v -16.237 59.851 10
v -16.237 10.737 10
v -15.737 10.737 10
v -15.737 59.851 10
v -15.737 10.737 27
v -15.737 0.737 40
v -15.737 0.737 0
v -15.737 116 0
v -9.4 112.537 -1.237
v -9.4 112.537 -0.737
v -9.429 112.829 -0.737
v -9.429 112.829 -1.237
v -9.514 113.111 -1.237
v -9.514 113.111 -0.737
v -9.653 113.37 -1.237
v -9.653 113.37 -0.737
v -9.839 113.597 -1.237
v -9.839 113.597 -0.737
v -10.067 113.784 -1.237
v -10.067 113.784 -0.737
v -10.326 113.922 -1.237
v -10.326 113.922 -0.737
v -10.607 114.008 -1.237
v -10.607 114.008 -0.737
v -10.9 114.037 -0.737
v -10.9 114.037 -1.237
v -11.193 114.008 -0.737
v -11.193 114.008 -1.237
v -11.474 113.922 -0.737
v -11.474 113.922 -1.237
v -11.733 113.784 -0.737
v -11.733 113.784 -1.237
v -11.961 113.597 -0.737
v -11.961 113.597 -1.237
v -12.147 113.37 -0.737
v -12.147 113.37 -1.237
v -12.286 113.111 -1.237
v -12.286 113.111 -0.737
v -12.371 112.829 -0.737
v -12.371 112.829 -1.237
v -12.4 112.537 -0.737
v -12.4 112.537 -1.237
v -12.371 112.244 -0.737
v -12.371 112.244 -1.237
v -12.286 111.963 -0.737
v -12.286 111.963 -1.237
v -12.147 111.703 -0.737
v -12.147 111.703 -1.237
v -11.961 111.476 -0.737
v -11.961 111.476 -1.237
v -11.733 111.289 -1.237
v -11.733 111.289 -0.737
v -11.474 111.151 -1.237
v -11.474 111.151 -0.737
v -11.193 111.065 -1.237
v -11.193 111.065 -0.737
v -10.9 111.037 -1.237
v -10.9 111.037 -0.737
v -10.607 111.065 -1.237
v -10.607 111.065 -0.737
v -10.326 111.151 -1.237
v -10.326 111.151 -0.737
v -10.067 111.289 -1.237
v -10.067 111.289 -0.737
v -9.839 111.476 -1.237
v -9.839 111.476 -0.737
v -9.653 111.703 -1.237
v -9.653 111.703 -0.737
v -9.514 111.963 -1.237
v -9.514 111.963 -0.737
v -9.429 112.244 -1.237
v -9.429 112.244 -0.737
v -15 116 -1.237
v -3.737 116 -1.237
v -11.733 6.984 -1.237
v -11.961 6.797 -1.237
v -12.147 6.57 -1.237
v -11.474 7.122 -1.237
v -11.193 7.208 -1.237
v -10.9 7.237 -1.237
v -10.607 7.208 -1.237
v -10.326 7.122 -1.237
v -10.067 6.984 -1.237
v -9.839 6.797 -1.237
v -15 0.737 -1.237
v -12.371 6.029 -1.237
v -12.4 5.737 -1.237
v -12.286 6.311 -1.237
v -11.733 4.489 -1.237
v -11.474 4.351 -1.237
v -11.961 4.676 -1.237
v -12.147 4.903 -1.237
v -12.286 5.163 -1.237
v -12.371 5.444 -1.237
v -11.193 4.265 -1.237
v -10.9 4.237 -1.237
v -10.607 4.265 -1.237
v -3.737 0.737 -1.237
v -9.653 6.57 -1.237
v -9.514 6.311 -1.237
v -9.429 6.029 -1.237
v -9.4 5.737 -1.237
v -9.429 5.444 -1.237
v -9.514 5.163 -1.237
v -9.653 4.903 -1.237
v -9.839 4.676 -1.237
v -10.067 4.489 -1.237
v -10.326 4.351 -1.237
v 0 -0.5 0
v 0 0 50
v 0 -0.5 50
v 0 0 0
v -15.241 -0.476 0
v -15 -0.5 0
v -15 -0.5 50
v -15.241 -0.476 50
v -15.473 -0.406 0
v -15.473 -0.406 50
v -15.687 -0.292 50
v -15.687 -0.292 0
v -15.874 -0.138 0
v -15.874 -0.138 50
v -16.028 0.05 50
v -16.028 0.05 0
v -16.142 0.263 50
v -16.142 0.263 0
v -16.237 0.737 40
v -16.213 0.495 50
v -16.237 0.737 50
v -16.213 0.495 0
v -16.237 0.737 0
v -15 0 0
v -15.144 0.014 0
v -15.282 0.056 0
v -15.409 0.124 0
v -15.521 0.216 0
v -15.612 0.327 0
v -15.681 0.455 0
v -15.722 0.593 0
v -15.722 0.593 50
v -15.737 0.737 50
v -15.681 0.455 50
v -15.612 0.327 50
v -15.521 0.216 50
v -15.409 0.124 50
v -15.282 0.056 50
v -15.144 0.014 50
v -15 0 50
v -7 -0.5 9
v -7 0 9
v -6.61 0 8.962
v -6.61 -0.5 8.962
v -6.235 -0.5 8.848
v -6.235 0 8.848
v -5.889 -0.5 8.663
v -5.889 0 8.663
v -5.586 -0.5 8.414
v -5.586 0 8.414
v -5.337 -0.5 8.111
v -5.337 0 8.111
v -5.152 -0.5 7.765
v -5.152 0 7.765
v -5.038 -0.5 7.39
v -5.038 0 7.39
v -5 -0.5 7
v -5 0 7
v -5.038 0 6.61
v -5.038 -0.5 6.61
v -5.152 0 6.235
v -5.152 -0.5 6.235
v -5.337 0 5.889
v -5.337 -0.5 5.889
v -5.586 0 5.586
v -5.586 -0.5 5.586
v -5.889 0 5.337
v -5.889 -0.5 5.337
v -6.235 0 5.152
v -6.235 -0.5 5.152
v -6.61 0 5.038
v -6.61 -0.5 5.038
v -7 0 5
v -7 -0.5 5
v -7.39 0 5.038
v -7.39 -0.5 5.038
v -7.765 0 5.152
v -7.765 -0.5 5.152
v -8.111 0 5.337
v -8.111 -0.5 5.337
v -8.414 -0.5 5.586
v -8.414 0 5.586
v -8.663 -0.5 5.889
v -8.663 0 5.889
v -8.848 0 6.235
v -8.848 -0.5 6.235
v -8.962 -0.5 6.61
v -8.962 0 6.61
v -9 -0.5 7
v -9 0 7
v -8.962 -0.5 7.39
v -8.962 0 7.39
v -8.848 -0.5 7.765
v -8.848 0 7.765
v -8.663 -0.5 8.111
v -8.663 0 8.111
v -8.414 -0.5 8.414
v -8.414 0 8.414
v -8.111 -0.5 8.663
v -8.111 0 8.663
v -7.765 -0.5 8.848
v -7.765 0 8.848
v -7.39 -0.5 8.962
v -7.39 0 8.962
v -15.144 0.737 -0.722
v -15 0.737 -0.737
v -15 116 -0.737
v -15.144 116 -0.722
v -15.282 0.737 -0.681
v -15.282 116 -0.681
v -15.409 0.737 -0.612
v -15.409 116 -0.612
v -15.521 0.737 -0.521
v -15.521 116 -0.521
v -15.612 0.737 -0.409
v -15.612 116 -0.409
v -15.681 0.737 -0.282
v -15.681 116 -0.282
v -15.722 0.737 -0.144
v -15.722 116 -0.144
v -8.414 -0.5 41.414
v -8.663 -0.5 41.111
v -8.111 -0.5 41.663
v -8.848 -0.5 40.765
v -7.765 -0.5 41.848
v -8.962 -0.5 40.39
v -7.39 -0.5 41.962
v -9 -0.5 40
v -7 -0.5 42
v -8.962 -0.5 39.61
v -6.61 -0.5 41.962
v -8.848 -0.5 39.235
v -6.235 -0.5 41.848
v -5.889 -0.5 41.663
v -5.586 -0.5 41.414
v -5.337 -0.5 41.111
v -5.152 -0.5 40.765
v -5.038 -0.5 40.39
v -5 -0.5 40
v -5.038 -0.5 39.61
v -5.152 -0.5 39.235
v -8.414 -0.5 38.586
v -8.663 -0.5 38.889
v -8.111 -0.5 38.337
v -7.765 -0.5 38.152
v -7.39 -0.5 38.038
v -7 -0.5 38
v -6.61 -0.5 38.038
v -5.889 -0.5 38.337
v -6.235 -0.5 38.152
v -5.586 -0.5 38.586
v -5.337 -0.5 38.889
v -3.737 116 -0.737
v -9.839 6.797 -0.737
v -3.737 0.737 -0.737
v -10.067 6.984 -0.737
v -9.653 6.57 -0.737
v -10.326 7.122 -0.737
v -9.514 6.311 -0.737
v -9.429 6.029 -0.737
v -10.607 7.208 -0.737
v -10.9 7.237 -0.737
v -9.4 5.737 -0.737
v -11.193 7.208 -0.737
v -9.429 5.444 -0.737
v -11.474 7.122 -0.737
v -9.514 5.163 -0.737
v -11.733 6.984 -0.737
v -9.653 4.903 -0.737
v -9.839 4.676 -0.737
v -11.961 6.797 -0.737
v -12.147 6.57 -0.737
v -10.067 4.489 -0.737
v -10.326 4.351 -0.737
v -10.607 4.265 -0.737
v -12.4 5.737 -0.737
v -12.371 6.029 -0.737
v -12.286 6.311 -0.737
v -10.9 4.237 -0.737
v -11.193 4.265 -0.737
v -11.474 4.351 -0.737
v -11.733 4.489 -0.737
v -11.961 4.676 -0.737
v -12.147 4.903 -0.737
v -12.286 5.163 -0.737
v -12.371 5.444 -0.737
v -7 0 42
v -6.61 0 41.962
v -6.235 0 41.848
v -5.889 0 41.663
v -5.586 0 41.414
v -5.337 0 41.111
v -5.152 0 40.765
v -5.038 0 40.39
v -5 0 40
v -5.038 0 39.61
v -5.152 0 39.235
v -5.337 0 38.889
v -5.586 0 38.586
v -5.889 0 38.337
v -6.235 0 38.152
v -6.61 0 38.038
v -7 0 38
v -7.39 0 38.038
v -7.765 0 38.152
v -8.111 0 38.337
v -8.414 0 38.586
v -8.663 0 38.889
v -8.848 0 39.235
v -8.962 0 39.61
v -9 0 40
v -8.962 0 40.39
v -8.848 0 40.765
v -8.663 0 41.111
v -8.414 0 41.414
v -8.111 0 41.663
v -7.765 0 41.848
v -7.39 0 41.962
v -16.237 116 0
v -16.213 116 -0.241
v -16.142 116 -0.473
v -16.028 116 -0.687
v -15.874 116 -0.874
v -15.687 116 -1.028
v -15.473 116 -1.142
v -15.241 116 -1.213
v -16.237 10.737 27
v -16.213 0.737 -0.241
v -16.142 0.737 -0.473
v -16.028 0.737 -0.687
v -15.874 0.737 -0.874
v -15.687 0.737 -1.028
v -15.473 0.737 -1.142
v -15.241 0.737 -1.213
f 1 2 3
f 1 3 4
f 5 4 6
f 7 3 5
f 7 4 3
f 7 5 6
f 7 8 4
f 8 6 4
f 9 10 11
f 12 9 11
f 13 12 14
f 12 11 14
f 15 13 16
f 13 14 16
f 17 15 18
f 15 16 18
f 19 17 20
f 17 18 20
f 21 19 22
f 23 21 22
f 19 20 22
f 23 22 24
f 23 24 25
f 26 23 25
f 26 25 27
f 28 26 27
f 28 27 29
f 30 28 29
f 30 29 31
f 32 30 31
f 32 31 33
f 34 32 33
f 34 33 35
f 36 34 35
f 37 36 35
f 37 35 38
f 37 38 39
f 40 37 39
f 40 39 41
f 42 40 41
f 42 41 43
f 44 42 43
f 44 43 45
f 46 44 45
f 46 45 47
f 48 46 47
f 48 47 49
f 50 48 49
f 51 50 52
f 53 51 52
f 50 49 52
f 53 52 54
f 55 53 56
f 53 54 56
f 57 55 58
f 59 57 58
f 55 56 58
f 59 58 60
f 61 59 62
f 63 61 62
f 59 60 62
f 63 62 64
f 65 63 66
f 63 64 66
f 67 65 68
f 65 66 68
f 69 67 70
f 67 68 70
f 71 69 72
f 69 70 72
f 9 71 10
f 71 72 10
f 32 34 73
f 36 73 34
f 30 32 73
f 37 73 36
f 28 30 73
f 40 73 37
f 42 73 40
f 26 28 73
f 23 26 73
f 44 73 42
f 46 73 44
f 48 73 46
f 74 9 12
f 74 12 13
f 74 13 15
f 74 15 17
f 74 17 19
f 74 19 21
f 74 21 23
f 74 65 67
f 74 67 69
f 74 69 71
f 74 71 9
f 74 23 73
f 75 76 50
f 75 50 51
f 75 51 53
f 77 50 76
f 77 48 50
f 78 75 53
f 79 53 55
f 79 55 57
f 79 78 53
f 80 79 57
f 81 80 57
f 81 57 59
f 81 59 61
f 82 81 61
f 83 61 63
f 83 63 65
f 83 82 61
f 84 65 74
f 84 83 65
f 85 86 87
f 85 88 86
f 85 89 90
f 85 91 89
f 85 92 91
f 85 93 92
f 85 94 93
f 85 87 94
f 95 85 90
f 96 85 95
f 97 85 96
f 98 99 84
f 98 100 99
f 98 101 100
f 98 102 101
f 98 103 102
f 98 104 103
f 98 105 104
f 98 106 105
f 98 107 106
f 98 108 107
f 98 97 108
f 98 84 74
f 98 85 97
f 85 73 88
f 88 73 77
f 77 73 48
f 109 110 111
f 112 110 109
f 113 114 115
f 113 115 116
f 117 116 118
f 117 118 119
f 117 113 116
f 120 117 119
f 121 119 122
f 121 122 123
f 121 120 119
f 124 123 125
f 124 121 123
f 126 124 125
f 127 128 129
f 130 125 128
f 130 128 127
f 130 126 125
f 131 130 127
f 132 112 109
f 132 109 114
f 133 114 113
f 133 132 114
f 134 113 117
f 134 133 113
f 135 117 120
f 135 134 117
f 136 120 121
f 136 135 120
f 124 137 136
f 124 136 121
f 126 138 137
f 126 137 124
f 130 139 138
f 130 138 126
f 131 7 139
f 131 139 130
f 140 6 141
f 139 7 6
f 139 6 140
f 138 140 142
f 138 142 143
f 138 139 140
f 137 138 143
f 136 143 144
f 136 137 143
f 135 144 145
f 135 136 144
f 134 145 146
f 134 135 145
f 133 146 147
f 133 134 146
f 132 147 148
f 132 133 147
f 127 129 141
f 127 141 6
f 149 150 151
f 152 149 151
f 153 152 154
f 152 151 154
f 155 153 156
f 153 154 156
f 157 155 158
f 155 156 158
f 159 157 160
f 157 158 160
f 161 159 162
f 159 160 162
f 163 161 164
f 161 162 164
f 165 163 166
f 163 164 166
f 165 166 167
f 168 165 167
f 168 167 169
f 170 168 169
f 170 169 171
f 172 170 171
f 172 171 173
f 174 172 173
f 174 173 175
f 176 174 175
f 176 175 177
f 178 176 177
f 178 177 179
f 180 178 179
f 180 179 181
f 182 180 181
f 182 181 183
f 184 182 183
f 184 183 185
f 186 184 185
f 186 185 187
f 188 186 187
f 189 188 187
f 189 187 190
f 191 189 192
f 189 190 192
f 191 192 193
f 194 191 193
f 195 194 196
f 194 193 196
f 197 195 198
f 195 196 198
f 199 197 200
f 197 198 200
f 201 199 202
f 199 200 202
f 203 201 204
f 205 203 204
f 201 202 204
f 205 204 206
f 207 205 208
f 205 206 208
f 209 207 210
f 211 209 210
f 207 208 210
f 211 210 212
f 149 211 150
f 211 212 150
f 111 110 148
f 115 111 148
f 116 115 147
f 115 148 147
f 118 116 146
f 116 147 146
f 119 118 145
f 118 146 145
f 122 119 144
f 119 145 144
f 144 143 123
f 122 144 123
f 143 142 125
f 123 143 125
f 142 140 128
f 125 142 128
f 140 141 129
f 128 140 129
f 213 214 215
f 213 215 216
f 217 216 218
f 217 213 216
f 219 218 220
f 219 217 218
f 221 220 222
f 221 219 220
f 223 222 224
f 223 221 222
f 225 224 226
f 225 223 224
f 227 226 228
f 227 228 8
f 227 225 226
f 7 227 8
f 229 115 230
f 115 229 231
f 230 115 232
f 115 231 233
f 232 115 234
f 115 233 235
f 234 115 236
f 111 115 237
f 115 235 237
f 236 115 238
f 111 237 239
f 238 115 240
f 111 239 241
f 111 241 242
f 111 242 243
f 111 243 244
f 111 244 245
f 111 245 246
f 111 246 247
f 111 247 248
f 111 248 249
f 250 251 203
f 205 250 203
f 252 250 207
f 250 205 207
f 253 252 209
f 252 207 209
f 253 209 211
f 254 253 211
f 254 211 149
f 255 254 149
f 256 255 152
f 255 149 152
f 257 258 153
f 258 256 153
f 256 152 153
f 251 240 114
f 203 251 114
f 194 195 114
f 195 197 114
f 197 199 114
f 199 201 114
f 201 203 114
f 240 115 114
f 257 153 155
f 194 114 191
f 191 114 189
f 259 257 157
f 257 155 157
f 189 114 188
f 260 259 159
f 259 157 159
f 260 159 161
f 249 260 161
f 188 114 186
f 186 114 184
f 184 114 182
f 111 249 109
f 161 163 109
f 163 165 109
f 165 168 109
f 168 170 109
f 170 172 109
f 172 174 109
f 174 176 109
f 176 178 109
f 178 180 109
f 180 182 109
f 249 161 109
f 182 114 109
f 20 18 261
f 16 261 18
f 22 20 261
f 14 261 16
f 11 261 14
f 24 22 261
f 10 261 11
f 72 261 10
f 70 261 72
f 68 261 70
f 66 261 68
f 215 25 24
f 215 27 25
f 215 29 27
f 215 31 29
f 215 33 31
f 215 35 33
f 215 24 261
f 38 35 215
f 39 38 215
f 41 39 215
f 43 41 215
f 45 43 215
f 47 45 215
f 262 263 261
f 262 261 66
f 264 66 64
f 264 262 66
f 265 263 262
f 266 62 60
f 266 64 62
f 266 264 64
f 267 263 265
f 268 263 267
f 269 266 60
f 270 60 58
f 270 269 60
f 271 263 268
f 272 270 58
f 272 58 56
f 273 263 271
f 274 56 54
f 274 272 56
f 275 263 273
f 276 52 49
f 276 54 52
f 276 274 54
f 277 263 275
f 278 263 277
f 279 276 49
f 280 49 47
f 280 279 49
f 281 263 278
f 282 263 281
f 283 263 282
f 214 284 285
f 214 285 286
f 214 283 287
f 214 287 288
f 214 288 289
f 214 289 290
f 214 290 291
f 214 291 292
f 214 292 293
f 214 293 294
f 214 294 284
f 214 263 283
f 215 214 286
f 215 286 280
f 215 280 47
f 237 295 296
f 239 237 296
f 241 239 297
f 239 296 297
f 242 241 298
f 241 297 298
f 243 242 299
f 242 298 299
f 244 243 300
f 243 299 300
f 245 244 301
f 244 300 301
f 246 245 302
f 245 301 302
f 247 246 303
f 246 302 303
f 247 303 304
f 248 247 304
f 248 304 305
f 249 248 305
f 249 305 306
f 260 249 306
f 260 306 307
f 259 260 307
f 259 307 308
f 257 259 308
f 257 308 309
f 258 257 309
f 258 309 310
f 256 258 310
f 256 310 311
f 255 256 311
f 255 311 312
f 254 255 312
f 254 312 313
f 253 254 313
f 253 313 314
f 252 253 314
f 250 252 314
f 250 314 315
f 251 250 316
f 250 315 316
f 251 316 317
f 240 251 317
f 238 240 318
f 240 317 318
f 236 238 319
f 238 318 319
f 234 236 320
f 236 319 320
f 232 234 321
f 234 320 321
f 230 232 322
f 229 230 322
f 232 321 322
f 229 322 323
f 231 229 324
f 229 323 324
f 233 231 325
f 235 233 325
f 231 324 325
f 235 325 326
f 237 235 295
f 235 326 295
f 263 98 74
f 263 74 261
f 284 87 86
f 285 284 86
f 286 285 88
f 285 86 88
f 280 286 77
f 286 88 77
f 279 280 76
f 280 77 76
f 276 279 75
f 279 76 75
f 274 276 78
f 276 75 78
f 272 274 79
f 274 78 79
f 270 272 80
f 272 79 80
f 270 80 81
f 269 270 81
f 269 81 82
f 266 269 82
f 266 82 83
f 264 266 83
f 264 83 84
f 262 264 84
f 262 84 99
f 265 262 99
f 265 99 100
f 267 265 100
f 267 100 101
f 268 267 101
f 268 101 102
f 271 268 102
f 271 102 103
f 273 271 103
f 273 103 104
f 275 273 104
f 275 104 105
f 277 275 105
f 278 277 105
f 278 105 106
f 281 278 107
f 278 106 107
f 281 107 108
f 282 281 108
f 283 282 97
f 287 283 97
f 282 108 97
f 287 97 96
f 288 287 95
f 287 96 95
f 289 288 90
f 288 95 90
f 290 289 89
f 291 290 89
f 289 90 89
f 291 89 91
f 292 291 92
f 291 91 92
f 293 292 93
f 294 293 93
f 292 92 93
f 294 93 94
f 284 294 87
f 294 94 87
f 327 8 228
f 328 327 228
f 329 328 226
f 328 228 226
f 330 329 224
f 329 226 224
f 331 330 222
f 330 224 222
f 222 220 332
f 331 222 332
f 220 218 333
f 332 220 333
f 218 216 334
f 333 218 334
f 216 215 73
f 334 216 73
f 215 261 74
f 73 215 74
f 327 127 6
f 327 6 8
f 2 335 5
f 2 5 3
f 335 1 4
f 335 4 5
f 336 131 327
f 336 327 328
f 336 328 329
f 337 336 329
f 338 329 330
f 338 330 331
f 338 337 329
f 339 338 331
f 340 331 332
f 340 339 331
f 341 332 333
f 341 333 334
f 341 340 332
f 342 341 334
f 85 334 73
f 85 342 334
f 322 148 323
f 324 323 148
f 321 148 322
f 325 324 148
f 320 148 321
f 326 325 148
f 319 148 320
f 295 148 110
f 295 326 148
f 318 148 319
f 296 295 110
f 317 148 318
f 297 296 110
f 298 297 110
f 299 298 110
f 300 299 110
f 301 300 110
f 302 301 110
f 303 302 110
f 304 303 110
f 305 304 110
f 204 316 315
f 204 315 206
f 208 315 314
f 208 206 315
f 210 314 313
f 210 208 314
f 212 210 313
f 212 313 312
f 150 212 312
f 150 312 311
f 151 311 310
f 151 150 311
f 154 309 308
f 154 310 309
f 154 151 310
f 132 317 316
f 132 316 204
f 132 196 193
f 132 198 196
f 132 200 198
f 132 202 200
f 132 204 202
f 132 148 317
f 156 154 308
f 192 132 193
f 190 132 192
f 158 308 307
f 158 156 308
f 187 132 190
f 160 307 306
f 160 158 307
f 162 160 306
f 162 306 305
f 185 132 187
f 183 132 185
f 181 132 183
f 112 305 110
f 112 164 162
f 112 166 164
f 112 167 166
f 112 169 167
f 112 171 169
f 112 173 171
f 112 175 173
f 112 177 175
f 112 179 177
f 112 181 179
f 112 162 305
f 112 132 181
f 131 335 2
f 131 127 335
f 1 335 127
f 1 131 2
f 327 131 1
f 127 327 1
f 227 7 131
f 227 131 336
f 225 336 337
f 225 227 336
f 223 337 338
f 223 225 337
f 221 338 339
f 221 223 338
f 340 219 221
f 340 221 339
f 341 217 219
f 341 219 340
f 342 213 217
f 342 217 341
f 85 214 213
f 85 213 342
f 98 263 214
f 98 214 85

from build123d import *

# Parameters (mm, degrees)
SKETCH2_W          = 15
SKETCH2_H          = 50
BASE_FLANGE1_DEPTH = 0.5
EDGE_FLANGE1_DEPTH = 50
CUT_EXTRUDE1_DEPTH = 10
EDGE_FLANGE2_DEPTH = 115.2634
CUT_EXTRUDE2_DEPTH = 10
SKETCH13_R         = 1.5
CUT_EXTRUDE3_DEPTH = 10
SKETCH14_R         = 1.5
CUT_EXTRUDE4_DEPTH = 10
SKETCH15_R         = 2
CUT_EXTRUDE5_DEPTH = 12
SKETCH16_R         = 2
CUT_EXTRUDE6_DEPTH = 12


# Sheet-metal steps are written as plain solids
with BuildPart() as part:
    # Sketch2 → Base-Flange1 (new body)
    with BuildSketch(Plane(origin=(0, 0, 0), x_dir=(1, 0, 0), z_dir=(0, 1, 0))):
        with Locations((-7.5, -25)):
            Rectangle(SKETCH2_W, SKETCH2_H)
    extrude(amount=-BASE_FLANGE1_DEPTH)

    # Edge-Flange1 section (across the edge) → Edge-Flange1 (add)
    with BuildSketch(Plane(origin=(-15.7366, 0, 0), x_dir=(1, 0, 0), z_dir=(0, 0, 1))):
        with BuildLine():
            Line((-0.5, 0.7366), (-0.5, 116))
            Line((-0.5, 116), (0, 116))
            Line((0, 116), (0, 0.7366))
            ThreePointArc((0, 0.7366), (0.215745145, 0.215745145), (0.7366, 0))
            Line((0.7366, 0), (0.7366, -0.5))
            ThreePointArc((0.7366, -0.5), (-0.137808246, -0.137808246), (-0.5, 0.7366))
        make_face()
    extrude(amount=EDGE_FLANGE1_DEPTH)

    # Sketch8 → Cut-Extrude1 (cut)
    with BuildSketch(Plane.ZY.offset(16.2366)):
        Polygon((40, 0.7366), (0, 116), (50, 116), (50, 0.7366), align=None)
    extrude(amount=-CUT_EXTRUDE1_DEPTH, mode=Mode.SUBTRACT)

    # Edge-Flange2 section (across the edge) → Edge-Flange2 (add)
    with BuildSketch(Plane(origin=(-15.7366, 0.7366, -0.7366), x_dir=(0, 0, 1), z_dir=(0, 1, 0))):
        with BuildLine():
            Line((-0.5, 0.7366), (-0.5, 12))
            Line((-0.5, 12), (0, 12))
            Line((0, 12), (0, 0.7366))
            ThreePointArc((0, 0.7366), (0.215745145, 0.215745145), (0.7366, 0))
            Line((0.7366, 0), (0.7366, -0.5))
            ThreePointArc((0.7366, -0.5), (-0.137808246, -0.137808246), (-0.5, 0.7366))
        make_face()
    extrude(amount=EDGE_FLANGE2_DEPTH)

    # Sketch12 → Cut-Extrude2 (cut)
    with BuildSketch(Plane.ZY.offset(16.2366)):
        Polygon((10, 59.851091606), (27, 10.7366), (10, 10.7366), align=None)
    extrude(amount=-CUT_EXTRUDE2_DEPTH, mode=Mode.SUBTRACT)

    # Sketch13 → Cut-Extrude3 (cut)
    with BuildSketch(Plane(origin=(0, 0, -1.2366), x_dir=(-1, 0, 0), z_dir=(0, 0, -1))):
        with Locations((10.9, 5.7366)):
            Circle(SKETCH13_R)
    extrude(amount=-CUT_EXTRUDE3_DEPTH, mode=Mode.SUBTRACT)

    # Sketch14 → Cut-Extrude4 (cut)
    with BuildSketch(Plane.XY.offset(-0.7366)):
        with Locations((-10.9, 112.5366)):
            Circle(SKETCH14_R)
    extrude(amount=-CUT_EXTRUDE4_DEPTH, mode=Mode.SUBTRACT)

    # Sketch15 → Cut-Extrude5 (cut)
    with BuildSketch(Plane(origin=(0, 0, 0), x_dir=(1, 0, 0), z_dir=(0, 1, 0))):
        with Locations(Location((-7, -40, 0), (0, 0, 270))):
            Circle(SKETCH15_R)
    extrude(amount=-CUT_EXTRUDE5_DEPTH, mode=Mode.SUBTRACT)

    # Sketch16 → Cut-Extrude6 (cut)
    with BuildSketch(Plane(origin=(0, 0, 0), x_dir=(1, 0, 0), z_dir=(0, 1, 0))):
        with Locations(Location((-7, -7, 0), (0, 0, 270))):
            Circle(SKETCH16_R)
    extrude(amount=-CUT_EXTRUDE6_DEPTH, mode=Mode.SUBTRACT)


solid = part.part
